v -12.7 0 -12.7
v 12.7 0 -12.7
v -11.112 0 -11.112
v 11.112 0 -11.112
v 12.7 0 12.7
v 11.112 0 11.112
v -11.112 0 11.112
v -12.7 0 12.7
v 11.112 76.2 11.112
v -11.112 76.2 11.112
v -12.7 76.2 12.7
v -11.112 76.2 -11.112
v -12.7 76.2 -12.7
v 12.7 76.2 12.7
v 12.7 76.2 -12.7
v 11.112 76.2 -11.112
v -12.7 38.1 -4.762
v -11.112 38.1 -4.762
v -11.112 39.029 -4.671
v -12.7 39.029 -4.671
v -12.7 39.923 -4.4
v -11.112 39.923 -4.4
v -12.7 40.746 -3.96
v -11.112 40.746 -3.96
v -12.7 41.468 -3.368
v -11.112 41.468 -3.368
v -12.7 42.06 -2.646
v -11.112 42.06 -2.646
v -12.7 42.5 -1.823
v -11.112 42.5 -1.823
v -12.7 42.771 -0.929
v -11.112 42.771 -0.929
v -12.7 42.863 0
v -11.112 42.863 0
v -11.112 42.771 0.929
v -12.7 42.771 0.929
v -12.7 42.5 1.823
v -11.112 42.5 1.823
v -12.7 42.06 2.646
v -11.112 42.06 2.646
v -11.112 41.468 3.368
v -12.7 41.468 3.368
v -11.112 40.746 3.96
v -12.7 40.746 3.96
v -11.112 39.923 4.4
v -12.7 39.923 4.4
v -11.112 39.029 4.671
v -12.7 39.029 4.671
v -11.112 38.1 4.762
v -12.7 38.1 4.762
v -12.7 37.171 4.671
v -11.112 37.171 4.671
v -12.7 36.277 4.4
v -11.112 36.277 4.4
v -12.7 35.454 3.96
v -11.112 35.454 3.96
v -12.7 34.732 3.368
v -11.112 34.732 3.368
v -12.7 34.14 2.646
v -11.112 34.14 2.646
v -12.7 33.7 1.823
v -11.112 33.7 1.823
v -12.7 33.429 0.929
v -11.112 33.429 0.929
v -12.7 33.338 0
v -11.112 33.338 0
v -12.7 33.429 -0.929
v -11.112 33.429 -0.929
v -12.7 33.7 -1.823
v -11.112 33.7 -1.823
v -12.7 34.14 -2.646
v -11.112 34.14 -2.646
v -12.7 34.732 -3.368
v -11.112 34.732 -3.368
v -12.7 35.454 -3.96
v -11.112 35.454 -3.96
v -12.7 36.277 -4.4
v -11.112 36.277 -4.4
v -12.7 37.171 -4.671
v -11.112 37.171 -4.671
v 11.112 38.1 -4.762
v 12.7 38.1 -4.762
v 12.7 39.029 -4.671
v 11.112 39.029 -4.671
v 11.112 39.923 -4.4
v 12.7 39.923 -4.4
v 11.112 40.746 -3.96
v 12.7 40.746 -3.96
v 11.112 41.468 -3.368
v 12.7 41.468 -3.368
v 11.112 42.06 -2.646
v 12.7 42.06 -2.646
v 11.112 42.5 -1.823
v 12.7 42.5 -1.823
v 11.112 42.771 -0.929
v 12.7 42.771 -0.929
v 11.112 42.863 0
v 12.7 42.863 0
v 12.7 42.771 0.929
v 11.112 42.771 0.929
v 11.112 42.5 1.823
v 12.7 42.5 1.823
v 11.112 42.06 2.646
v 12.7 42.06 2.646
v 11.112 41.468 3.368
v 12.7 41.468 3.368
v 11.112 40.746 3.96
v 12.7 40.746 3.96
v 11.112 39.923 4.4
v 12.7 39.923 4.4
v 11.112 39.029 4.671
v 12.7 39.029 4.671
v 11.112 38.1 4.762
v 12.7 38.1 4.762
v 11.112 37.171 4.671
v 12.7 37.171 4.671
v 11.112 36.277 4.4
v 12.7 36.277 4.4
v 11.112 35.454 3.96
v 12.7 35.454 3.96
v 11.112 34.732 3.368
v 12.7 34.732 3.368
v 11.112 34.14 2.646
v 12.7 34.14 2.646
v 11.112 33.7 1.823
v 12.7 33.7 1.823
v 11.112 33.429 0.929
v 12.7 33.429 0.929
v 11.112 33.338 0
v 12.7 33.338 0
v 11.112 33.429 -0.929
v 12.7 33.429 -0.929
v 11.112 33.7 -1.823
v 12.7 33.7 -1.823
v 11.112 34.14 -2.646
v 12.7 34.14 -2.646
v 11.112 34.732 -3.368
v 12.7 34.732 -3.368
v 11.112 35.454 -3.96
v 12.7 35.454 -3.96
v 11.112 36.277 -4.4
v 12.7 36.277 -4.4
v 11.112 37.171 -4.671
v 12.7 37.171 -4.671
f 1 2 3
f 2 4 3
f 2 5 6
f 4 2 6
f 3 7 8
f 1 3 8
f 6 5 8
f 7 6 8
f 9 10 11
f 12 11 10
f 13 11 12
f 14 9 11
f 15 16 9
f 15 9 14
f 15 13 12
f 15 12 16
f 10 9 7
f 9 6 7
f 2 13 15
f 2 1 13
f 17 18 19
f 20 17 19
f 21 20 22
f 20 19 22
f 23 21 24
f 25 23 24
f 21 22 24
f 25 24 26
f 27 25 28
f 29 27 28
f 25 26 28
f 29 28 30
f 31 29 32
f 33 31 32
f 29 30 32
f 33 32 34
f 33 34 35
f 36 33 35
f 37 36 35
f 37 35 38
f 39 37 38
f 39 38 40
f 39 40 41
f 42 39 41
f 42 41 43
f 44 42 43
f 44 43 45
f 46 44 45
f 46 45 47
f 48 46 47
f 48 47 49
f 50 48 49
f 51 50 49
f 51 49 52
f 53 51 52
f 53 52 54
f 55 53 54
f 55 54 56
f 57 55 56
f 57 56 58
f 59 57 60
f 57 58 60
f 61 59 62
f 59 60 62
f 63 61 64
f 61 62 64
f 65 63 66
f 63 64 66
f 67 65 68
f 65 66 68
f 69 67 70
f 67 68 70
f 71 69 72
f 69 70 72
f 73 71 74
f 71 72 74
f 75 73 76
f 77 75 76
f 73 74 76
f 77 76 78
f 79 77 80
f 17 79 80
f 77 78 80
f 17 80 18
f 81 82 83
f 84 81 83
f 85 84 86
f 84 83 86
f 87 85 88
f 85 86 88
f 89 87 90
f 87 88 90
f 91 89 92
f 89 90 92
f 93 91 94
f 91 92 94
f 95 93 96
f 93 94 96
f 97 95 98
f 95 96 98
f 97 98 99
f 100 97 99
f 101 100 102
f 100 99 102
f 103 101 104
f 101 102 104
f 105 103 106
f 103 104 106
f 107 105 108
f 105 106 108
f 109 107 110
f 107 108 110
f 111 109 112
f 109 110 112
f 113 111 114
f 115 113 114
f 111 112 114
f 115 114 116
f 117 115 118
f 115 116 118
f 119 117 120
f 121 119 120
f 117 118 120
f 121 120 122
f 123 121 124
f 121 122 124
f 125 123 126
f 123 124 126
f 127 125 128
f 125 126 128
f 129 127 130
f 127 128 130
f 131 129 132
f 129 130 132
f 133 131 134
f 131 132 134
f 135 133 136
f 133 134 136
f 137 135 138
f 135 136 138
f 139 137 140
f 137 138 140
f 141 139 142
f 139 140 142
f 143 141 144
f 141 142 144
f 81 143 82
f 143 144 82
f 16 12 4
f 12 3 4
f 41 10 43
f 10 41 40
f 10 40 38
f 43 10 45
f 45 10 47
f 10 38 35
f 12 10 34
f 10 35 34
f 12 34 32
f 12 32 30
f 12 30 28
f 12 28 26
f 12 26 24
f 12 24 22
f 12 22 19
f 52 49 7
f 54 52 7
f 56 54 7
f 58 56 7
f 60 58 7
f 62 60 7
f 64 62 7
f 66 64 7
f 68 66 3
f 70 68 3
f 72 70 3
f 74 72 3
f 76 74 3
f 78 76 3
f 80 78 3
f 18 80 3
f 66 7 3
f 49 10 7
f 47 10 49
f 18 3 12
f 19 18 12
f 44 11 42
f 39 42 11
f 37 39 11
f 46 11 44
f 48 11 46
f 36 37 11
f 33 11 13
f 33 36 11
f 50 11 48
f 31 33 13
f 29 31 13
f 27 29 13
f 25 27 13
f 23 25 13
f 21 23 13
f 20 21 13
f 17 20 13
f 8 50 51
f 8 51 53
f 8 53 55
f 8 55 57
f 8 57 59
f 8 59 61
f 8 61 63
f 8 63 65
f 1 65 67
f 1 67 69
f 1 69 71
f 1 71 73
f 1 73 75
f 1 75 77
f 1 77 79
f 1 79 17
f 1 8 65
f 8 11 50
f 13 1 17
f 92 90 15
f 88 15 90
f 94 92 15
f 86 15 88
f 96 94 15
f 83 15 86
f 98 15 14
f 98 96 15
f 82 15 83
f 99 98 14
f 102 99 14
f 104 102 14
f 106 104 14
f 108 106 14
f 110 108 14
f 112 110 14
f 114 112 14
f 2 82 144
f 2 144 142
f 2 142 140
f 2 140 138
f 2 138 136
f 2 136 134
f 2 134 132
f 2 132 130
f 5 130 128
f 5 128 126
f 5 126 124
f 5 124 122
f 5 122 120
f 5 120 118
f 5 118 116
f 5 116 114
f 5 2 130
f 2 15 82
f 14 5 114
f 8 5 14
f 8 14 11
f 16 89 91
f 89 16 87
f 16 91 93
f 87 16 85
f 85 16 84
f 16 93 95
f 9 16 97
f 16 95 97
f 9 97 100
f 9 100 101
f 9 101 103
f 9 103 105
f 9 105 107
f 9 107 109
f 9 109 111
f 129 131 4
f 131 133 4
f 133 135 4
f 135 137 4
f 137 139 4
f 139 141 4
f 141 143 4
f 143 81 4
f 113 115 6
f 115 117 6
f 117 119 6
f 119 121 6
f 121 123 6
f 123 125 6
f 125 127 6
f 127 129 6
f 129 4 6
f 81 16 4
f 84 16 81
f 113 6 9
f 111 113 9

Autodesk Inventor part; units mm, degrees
ref_plane "YZ Plane" through (0, 0, 0) normal (1, 0, 0) x (0, 1, 0)
ref_plane "XZ Plane" through (0, 0, 0) normal (0, 1, 0) x (-1, 0, 0)
ref_plane "XY Plane" through (0, 0, 0) normal (0, 0, 1) x (1, 0, 0)
sketch "Sketch1" plane through (0, 0, 0) normal (0, 1, 0) x (-1, 0, 0)
  line L0 (12.7, 12.7) -> (12.7, -12.7)
  line L1 (12.7, -12.7) -> (-12.7, -12.7)
  line L2 (-12.7, -12.7) -> (-12.7, 12.7)
  line L3 (-12.7, 12.7) -> (12.7, 12.7)
  line L4 (12.7, 12.7) -> (-12.7, -12.7) construction
  line L5 (12.7, -12.7) -> (-12.7, 12.7) construction
  line L6 (11.1125, 11.1125) -> (11.1125, -11.1125)
  line L7 (11.1125, -11.1125) -> (-11.1125, -11.1125)
  line L8 (-11.1125, -11.1125) -> (-11.1125, 11.1125)
  line L9 (-11.1125, 11.1125) -> (11.1125, 11.1125)
  line L10 (11.1125, 11.1125) -> (-11.1125, -11.1125) construction
  line L11 (11.1125, -11.1125) -> (-11.1125, 11.1125) construction
  point P0 (0, 0)
  dimension "d0" = 25.4
  dimension "d1" = 25.4
  dimension "d2" = 1.5875
  dimension "d3" = 1.5875
extrude "Extrusion1" add sketch "Sketch1" along normal blind 660.4
sketch "Sketch2" plane through (12.7, 0, 12.7) normal (1, 0, 0) x (0, 0, -1)
  line L0 (12.7, 0) -> (12.7, 38.1)
  circle A0 centre (12.7, 38.1) radius 4.7625
  line L1 (3.9688, 38.1) -> (8.3344, 45.6615)
  line L2 (8.3344, 45.6615) -> (17.0656, 45.6615)
  line L3 (17.0656, 45.6615) -> (21.4313, 38.1)
  line L4 (21.4313, 38.1) -> (17.0656, 30.5385)
  line L5 (17.0656, 30.5385) -> (8.3344, 30.5385)
  line L6 (8.3344, 30.5385) -> (3.9688, 38.1)
  dimension "d6" = 38.1
  dimension "d7" = 9.525
  dimension "d8" = 8.7312
extrude "Extrusion2" cut sketch "Sketch2" against normal blind 46.6 contours A0
sketch "Sketch3" plane through (12.7, 0, 12.7) normal (1, 0, 0) x (0, 0, -1)
  line L0 (12.7, 0) -> (12.7, 177.8)
  line L1 (0, 0) -> (0, 660.4) projected
  line L2 (0, 177.8) -> (180.4268, 177.8)
  line L3 (180.4268, 177.8) -> (180.4268, 742.2297)
  line L4 (180.4268, 742.2297) -> (0, 742.2297)
  line L5 (0, 742.2297) -> (0, 177.8)
  dimension "d11" = 177.8
extrude "Extrusion3" cut sketch "Sketch3" against normal blind 354.85
sketch "Sketch4" plane through (12.7, 0, 12.7) normal (1, 0, 0) x (0, 0, -1)
  point P0 (12.7, 0)
sketch "Sketch5" plane through (12.7, 0, 12.7) normal (1, 0, 0) x (0, 0, -1)
  line L0 (12.7, 0) -> (12.7, 114.3)
  line L1 (12.7, 114.3) -> (91.9102, 114.3)
  line L2 (91.9102, 114.3) -> (43.6603, 200.7395)
  line L3 (43.6603, 200.7395) -> (-39.5707, 207.1728)
  line L4 (-39.5707, 207.1728) -> (-50.6279, 117.9106)
  line L5 (-50.6279, 117.9106) -> (-45.0993, 114.3)
  line L6 (-45.0993, 114.3) -> (12.7, 114.3)
  dimension "d14" = 114.3
extrude "Extrusion4" cut sketch "Sketch5" against normal blind 40.85
sketch "Sketch6" plane through (12.7, 114.3, 12.7) normal (0, 1, 0) x (1, 0, 0)
  line L0 (0, 0) -> (-25.4, 0) projected
  line L1 (0, 25.4) -> (0, 0) projected
  line L2 (-25.4, 25.4) -> (0, 25.4) projected
  line L3 (-25.4, 0) -> (-25.4, 25.4) projected
  line L4 (-1.5875, 23.8125) -> (-23.8125, 23.8125) projected
  line L5 (-1.5875, 1.5875) -> (-1.5875, 23.8125) projected
  line L6 (-23.8125, 1.5875) -> (-1.5875, 1.5875) projected
  line L7 (-23.8125, 23.8125) -> (-23.8125, 1.5875) projected
  point P0 (-12.7, 12.7)
extrude "Extrusion5" cut sketch "Sketch6" against normal blind 38.1
properties part number "Tube End" material "Aluminum 6061"
